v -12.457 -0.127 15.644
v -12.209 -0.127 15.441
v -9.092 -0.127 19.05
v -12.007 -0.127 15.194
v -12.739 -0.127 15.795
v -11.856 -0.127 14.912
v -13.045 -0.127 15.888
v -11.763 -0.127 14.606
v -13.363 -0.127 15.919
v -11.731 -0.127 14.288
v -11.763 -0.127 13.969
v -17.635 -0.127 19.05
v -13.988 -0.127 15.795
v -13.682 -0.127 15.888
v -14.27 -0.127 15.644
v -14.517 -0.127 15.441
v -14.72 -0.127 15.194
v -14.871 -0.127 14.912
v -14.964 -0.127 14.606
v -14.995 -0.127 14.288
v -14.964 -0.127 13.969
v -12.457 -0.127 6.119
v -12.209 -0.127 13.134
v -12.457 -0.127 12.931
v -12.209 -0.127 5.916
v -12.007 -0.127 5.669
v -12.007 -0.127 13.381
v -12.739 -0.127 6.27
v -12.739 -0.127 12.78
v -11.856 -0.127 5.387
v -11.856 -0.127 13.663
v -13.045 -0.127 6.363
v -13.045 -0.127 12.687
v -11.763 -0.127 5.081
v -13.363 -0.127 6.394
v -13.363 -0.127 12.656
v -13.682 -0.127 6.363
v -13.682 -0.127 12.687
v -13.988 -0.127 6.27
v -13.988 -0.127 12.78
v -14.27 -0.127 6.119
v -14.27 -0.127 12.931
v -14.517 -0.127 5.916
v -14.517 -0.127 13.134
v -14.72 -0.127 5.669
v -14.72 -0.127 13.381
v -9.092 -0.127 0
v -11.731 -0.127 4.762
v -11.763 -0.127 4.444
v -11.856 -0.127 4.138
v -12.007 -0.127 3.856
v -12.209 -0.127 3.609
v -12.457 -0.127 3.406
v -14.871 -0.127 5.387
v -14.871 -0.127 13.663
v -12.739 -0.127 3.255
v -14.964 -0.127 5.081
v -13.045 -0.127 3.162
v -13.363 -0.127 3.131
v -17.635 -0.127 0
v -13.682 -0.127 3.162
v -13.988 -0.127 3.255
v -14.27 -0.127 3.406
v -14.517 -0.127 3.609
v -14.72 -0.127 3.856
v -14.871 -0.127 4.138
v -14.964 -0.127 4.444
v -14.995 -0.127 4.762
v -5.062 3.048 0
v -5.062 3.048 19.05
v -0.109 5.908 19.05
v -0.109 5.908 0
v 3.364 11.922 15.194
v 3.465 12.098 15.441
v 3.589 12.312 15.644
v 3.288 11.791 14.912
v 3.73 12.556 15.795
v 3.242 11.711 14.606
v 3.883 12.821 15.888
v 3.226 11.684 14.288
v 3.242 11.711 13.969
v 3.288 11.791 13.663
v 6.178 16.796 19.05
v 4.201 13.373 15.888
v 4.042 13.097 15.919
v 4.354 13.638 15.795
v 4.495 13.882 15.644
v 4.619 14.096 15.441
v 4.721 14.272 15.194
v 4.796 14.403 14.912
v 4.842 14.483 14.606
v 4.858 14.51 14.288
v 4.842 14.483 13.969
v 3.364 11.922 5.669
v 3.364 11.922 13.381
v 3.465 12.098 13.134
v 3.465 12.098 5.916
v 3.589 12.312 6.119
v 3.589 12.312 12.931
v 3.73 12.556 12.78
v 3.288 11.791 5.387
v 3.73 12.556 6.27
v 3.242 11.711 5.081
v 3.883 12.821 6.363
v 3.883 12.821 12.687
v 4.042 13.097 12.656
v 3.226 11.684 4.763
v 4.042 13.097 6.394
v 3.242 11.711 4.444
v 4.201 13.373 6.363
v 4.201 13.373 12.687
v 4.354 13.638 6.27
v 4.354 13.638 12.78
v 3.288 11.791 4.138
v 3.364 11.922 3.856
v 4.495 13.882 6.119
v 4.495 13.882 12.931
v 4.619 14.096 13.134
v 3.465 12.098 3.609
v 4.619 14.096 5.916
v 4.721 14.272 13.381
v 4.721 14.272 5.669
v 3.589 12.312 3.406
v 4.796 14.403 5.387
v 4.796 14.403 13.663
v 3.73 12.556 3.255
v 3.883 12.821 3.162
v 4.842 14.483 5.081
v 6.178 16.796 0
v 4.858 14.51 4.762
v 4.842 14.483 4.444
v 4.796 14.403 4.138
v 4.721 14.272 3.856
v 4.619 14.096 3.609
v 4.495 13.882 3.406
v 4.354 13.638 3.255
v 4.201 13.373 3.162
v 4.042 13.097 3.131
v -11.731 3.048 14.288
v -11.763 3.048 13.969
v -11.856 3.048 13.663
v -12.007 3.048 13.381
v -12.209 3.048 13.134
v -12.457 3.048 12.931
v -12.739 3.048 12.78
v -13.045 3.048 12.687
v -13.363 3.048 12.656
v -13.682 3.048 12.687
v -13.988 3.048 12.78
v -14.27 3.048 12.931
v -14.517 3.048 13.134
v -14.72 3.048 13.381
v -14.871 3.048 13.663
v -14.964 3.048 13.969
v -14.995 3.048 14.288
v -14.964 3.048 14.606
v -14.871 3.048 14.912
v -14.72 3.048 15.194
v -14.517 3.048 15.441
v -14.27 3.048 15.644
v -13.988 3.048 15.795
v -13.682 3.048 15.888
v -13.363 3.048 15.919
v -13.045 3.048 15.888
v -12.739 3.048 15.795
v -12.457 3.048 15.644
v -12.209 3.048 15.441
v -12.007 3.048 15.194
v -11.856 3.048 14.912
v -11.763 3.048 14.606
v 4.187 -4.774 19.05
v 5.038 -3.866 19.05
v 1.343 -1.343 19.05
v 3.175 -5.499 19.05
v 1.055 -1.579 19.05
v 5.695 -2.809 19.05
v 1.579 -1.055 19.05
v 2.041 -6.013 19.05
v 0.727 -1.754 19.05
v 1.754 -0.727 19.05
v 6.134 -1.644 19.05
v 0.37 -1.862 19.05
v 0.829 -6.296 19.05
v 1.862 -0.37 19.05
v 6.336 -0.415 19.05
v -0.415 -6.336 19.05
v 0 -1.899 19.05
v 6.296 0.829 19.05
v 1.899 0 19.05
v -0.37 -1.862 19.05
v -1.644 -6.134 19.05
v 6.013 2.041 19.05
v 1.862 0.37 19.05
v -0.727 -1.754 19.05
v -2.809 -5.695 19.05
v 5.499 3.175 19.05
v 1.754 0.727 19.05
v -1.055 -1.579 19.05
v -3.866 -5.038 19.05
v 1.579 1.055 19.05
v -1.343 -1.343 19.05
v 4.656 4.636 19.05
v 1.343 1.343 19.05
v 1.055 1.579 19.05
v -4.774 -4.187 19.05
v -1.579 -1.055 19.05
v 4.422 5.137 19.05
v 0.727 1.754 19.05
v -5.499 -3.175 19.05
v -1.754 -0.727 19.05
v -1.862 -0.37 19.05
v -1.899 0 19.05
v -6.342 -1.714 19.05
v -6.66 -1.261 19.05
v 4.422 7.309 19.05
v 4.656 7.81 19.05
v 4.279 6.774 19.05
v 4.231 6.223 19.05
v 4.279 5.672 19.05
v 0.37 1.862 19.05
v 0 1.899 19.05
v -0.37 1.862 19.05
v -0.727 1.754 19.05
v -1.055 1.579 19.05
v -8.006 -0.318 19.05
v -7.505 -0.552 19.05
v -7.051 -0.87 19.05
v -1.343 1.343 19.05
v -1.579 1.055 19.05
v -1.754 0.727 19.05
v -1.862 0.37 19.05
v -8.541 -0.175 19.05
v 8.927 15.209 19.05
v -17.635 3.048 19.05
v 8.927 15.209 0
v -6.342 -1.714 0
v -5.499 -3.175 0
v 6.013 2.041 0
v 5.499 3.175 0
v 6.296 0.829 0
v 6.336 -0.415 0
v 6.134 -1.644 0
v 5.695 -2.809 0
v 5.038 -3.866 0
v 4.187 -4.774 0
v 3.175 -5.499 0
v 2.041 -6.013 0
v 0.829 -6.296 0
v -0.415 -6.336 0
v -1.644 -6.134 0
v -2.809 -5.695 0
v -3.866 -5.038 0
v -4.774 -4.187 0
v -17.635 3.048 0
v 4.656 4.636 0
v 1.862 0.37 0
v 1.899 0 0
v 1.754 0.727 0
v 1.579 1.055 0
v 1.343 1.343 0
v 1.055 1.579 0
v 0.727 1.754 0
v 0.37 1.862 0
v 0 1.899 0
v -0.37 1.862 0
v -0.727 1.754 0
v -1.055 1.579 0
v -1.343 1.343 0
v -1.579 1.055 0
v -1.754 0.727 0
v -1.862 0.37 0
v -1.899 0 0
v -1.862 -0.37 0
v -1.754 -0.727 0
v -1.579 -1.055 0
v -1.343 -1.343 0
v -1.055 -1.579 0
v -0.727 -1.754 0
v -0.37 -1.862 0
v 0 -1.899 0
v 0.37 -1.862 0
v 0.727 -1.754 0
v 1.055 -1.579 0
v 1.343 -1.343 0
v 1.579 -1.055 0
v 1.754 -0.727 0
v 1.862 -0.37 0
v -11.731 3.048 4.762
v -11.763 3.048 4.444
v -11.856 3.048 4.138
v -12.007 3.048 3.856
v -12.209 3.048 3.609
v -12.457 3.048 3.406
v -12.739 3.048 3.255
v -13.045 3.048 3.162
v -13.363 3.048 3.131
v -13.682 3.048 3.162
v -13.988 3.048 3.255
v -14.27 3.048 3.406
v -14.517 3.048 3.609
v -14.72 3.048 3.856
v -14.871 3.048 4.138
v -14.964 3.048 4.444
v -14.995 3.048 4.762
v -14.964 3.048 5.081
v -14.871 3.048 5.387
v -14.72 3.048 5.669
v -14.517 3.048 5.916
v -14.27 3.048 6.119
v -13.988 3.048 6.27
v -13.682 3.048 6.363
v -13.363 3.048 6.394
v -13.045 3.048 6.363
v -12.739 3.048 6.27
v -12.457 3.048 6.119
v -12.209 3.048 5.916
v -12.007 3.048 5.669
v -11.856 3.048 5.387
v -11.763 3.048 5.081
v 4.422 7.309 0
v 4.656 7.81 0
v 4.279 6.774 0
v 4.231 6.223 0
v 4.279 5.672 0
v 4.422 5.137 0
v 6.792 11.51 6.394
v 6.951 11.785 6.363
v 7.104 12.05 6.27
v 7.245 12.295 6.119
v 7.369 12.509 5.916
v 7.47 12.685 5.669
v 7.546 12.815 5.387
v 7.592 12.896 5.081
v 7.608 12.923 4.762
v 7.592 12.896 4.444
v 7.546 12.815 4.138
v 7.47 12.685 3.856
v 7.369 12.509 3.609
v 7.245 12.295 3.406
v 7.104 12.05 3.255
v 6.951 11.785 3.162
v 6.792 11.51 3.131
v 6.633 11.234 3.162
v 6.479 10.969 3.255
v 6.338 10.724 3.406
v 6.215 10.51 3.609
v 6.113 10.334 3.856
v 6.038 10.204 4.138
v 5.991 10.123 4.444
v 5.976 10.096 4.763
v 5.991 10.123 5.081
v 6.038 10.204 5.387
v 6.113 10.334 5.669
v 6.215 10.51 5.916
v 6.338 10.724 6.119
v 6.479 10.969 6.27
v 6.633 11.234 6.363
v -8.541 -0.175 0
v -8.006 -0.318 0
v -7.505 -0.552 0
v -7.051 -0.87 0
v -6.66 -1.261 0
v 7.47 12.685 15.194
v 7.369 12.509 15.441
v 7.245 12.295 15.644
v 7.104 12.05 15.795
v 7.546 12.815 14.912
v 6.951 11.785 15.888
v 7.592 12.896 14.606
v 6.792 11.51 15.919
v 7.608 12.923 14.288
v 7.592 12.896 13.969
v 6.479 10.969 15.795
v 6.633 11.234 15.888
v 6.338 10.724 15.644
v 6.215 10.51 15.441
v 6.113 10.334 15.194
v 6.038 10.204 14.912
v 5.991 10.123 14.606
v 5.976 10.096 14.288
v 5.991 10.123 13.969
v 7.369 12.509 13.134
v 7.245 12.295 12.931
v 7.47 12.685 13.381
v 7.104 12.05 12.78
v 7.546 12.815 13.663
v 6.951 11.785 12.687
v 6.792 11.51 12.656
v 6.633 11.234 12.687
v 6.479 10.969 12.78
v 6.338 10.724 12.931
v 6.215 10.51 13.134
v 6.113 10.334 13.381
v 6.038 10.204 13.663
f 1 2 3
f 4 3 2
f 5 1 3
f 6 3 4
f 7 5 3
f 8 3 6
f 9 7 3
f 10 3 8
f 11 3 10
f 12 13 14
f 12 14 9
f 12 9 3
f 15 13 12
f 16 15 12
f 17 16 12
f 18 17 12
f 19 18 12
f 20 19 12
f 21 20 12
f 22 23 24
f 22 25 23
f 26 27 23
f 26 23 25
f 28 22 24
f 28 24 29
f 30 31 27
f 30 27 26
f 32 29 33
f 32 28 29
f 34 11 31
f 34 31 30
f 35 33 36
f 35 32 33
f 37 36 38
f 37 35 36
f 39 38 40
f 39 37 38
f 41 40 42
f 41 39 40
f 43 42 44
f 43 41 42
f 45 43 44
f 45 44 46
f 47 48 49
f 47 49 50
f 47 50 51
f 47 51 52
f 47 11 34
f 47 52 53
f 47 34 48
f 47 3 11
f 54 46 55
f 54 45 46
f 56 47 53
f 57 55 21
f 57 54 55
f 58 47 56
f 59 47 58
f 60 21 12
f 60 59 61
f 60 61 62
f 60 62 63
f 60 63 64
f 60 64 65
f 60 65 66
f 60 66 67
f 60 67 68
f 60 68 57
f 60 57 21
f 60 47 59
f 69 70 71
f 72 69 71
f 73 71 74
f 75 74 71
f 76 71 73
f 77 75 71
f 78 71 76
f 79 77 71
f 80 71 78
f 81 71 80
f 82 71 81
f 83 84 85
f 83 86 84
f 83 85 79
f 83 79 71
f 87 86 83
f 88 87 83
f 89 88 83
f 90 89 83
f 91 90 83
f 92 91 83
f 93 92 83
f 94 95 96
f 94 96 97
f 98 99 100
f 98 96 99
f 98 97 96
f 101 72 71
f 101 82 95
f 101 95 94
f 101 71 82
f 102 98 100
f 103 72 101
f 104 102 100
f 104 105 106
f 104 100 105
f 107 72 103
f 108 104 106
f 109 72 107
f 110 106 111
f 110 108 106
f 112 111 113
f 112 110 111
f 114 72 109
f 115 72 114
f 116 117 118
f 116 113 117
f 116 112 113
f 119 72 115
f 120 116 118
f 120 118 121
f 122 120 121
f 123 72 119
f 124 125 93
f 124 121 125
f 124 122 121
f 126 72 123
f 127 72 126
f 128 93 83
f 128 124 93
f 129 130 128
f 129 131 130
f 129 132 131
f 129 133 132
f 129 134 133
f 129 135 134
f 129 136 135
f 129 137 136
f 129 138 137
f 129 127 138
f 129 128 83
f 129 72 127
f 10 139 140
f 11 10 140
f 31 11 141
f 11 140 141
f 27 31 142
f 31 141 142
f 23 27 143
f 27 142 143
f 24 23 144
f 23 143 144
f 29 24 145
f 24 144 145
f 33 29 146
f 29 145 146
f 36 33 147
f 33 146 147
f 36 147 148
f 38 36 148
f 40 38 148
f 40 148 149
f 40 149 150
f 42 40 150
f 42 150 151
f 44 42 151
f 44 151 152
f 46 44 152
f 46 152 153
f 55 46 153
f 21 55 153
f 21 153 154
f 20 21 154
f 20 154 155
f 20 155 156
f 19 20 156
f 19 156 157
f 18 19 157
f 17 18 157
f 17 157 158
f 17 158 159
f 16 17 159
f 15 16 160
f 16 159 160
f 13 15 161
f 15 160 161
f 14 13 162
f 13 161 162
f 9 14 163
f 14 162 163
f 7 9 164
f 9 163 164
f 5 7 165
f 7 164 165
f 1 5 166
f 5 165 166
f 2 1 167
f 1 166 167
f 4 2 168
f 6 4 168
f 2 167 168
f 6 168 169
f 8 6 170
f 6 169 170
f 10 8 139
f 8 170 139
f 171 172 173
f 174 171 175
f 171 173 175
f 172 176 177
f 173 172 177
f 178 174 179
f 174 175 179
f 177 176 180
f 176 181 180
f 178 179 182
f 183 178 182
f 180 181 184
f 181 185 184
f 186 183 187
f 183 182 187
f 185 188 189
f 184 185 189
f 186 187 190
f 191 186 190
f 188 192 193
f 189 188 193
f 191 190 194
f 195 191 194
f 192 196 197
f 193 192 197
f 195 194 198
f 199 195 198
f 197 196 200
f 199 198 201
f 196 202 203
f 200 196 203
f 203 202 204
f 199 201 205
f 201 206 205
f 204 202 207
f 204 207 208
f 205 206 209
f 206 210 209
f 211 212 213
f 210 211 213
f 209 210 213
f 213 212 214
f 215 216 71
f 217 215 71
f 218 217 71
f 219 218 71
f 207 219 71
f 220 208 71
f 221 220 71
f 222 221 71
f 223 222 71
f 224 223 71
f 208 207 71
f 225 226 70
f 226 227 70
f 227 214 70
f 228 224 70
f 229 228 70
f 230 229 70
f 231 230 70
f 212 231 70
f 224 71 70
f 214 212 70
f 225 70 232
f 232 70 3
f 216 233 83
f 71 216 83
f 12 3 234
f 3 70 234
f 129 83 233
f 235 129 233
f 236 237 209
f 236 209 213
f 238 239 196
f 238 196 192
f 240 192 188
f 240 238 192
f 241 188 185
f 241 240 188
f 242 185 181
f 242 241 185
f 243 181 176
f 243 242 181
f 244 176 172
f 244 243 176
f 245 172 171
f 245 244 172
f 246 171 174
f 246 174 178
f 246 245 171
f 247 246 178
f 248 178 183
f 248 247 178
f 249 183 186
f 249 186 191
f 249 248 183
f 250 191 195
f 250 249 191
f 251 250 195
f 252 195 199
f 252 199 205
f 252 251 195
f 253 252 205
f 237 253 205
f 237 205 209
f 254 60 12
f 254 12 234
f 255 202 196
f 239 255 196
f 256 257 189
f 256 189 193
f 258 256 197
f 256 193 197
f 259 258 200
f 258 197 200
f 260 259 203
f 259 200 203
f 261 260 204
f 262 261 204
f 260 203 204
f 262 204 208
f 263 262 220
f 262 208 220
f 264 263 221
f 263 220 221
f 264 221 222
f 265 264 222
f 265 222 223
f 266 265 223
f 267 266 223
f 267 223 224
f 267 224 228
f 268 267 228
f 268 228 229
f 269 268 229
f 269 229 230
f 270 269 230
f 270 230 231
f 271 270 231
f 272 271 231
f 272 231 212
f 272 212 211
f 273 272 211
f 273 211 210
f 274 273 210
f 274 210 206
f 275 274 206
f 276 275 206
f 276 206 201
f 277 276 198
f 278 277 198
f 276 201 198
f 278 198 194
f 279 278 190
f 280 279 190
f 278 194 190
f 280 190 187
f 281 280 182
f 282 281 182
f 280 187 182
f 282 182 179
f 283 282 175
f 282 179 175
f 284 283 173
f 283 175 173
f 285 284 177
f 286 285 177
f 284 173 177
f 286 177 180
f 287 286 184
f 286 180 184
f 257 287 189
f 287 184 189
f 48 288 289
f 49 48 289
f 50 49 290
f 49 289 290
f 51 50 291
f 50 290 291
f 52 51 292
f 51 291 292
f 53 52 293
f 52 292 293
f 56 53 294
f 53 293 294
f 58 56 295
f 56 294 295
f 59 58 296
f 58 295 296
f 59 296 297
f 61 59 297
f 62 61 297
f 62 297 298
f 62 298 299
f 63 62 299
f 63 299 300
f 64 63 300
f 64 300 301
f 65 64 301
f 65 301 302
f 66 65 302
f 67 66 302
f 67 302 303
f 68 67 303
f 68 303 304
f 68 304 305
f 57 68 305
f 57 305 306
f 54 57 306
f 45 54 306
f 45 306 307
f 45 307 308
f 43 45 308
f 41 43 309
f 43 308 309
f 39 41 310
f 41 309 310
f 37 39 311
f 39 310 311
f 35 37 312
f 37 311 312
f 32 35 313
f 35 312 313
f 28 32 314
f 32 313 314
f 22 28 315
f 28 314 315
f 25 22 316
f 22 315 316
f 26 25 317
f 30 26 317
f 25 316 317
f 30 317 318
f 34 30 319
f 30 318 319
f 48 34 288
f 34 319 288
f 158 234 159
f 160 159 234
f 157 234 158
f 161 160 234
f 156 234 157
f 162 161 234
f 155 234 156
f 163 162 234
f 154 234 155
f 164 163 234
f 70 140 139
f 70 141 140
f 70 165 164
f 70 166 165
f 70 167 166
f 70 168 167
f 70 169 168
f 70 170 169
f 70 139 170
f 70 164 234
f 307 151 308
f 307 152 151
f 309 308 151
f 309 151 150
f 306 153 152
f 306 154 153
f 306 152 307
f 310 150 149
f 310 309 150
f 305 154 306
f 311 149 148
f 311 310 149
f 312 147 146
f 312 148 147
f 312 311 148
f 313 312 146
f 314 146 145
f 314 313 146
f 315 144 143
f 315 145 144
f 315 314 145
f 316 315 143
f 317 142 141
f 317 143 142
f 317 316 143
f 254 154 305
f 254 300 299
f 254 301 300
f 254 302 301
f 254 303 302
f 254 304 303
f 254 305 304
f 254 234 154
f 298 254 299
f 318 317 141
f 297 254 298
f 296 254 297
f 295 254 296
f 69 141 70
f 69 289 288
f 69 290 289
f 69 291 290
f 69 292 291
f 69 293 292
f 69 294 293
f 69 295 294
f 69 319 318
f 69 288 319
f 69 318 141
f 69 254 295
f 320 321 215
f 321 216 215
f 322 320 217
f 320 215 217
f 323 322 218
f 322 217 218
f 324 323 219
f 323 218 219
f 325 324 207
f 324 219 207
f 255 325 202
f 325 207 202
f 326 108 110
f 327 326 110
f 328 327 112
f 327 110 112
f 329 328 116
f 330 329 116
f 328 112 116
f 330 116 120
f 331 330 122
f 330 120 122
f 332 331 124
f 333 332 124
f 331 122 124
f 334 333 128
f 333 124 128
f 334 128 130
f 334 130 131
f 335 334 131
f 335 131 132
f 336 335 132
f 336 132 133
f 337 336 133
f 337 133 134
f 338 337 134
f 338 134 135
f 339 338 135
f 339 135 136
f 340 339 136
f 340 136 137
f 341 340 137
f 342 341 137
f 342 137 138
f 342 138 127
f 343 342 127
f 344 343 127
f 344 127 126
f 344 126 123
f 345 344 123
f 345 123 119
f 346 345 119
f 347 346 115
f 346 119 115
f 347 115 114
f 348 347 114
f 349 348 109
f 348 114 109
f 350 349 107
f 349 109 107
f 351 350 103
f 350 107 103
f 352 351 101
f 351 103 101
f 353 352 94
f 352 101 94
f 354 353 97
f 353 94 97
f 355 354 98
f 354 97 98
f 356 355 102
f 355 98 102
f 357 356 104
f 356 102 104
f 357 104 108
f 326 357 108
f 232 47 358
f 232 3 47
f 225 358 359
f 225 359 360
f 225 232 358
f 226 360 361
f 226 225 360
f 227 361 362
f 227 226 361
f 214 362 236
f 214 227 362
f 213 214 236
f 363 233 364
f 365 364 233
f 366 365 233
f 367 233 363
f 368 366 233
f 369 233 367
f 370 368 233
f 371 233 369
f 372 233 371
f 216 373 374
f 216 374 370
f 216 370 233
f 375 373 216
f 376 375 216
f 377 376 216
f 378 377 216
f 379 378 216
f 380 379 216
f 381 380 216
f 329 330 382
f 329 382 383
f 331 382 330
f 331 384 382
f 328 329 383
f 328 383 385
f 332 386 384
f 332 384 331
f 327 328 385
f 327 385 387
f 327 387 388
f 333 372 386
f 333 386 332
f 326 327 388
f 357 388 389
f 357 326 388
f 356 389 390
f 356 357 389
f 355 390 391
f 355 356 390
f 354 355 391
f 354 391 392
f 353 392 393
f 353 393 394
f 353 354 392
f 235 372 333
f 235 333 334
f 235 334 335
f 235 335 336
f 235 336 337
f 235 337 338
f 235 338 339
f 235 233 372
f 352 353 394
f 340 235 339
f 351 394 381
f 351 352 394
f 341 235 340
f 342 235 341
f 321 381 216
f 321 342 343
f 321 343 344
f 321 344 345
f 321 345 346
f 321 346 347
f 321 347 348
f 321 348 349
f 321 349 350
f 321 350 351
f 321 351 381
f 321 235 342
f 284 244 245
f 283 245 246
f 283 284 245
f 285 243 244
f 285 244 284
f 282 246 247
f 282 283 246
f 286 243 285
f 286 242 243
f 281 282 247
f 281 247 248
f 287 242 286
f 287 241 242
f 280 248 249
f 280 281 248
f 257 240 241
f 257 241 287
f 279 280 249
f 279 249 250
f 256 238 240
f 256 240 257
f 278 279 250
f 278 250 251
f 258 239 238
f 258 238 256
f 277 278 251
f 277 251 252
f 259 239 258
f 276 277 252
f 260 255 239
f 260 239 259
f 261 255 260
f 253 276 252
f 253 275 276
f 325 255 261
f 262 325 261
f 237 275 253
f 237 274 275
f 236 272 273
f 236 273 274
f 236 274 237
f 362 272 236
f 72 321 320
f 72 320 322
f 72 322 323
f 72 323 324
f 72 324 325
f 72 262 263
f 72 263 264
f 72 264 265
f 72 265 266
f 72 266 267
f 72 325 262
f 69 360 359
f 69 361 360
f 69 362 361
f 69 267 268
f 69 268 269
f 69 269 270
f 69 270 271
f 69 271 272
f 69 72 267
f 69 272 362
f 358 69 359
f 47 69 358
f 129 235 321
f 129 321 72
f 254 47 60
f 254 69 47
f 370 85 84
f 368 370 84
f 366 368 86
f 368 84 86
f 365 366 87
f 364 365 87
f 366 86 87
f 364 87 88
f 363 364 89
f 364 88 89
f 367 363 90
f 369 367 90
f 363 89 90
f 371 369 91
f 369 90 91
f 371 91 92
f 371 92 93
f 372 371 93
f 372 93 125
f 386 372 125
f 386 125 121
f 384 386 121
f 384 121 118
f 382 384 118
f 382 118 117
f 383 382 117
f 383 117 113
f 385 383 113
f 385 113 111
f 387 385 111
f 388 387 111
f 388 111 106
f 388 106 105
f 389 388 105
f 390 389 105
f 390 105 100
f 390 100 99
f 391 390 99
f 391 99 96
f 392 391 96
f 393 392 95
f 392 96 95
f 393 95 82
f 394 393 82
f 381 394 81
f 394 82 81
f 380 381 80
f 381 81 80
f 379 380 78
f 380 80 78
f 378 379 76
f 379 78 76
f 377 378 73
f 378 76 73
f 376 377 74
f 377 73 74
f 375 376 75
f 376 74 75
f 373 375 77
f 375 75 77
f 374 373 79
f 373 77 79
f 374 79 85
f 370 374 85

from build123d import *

# Parameters (mm, degrees)
BOSS_EXTRUDE1_DEPTH     = 19.05
F_6_CLEARANCE_HOLE1_D   = 3.7973
FILLET1_R               = 3.175
E_0_25_DIAMETER_HOLE1_D = 3.2639
E_0_25_DIAMETER_HOLE2_D = 3.2639


with BuildPart() as part:
    # Sketch1 → Boss-Extrude1 (new body)
    with BuildSketch(Plane.XY):
        with BuildLine():
            Line((-0.10876362, 5.907615883), (6.17773638, 16.796153285))
            Line((6.17773638, 16.796153285), (8.927367037, 15.208653285))
            Line((8.927367037, 15.208653285), (3.739497694, 6.223))
            Line((3.739497694, 6.223), (5.499261314, 3.175))
            ThreePointArc((5.499261314, 3.175), (3.175, -5.499261314), (-5.499261314, -3.175))
            Line((-5.499261314, -3.175), (-7.259024935, -0.127))
            Line((-7.259024935, -0.127), (-17.63476362, -0.127))
            Line((-17.63476362, -0.127), (-17.63476362, 3.048))
            Line((-17.63476362, 3.048), (-5.06176362, 3.048))
            Line((-5.06176362, 3.048), (-0.10876362, 5.907615883))
        make_face()
    extrude(amount=BOSS_EXTRUDE1_DEPTH)

    # #6 Clearance Hole1 (through all)
    with Locations(Plane(origin=(0, 0, 0), x_dir=(-1, 0, 0), z_dir=(0, 0, -1))):
        with Locations((0, 0)):
            Hole(F_6_CLEARANCE_HOLE1_D / 2)

    # Fillet1
    fillet1_edges = [part.edges().sort_by_distance(p)[0] for p in [
        (3.739497694, 6.223, 9.525),
        (-7.259024935, -0.127, 9.525),
    ]]
    fillet(fillet1_edges, radius=FILLET1_R)

    # E (0.25) Diameter Hole1 (through all)
    with Locations(Plane(origin=(0.109985226, -0.0635, 0), x_dir=(0, 0, -1), z_dir=(0.86602540378444, -0.49999999999999784, 0))):
        with Locations((-4.7625, 13.36343783), (-14.2875, 13.36343783)):
            Hole(E_0_25_DIAMETER_HOLE1_D / 2)

    # E (0.25) Diameter Hole2 (through all)
    with Locations(Plane(origin=(-13.36343783, -0.127, 14.2875), x_dir=(-1, 0, 0), z_dir=(0, -1, 0))):
        with Locations((0, 0), (0, 9.525)):
            Hole(E_0_25_DIAMETER_HOLE2_D / 2)


solid = part.part
